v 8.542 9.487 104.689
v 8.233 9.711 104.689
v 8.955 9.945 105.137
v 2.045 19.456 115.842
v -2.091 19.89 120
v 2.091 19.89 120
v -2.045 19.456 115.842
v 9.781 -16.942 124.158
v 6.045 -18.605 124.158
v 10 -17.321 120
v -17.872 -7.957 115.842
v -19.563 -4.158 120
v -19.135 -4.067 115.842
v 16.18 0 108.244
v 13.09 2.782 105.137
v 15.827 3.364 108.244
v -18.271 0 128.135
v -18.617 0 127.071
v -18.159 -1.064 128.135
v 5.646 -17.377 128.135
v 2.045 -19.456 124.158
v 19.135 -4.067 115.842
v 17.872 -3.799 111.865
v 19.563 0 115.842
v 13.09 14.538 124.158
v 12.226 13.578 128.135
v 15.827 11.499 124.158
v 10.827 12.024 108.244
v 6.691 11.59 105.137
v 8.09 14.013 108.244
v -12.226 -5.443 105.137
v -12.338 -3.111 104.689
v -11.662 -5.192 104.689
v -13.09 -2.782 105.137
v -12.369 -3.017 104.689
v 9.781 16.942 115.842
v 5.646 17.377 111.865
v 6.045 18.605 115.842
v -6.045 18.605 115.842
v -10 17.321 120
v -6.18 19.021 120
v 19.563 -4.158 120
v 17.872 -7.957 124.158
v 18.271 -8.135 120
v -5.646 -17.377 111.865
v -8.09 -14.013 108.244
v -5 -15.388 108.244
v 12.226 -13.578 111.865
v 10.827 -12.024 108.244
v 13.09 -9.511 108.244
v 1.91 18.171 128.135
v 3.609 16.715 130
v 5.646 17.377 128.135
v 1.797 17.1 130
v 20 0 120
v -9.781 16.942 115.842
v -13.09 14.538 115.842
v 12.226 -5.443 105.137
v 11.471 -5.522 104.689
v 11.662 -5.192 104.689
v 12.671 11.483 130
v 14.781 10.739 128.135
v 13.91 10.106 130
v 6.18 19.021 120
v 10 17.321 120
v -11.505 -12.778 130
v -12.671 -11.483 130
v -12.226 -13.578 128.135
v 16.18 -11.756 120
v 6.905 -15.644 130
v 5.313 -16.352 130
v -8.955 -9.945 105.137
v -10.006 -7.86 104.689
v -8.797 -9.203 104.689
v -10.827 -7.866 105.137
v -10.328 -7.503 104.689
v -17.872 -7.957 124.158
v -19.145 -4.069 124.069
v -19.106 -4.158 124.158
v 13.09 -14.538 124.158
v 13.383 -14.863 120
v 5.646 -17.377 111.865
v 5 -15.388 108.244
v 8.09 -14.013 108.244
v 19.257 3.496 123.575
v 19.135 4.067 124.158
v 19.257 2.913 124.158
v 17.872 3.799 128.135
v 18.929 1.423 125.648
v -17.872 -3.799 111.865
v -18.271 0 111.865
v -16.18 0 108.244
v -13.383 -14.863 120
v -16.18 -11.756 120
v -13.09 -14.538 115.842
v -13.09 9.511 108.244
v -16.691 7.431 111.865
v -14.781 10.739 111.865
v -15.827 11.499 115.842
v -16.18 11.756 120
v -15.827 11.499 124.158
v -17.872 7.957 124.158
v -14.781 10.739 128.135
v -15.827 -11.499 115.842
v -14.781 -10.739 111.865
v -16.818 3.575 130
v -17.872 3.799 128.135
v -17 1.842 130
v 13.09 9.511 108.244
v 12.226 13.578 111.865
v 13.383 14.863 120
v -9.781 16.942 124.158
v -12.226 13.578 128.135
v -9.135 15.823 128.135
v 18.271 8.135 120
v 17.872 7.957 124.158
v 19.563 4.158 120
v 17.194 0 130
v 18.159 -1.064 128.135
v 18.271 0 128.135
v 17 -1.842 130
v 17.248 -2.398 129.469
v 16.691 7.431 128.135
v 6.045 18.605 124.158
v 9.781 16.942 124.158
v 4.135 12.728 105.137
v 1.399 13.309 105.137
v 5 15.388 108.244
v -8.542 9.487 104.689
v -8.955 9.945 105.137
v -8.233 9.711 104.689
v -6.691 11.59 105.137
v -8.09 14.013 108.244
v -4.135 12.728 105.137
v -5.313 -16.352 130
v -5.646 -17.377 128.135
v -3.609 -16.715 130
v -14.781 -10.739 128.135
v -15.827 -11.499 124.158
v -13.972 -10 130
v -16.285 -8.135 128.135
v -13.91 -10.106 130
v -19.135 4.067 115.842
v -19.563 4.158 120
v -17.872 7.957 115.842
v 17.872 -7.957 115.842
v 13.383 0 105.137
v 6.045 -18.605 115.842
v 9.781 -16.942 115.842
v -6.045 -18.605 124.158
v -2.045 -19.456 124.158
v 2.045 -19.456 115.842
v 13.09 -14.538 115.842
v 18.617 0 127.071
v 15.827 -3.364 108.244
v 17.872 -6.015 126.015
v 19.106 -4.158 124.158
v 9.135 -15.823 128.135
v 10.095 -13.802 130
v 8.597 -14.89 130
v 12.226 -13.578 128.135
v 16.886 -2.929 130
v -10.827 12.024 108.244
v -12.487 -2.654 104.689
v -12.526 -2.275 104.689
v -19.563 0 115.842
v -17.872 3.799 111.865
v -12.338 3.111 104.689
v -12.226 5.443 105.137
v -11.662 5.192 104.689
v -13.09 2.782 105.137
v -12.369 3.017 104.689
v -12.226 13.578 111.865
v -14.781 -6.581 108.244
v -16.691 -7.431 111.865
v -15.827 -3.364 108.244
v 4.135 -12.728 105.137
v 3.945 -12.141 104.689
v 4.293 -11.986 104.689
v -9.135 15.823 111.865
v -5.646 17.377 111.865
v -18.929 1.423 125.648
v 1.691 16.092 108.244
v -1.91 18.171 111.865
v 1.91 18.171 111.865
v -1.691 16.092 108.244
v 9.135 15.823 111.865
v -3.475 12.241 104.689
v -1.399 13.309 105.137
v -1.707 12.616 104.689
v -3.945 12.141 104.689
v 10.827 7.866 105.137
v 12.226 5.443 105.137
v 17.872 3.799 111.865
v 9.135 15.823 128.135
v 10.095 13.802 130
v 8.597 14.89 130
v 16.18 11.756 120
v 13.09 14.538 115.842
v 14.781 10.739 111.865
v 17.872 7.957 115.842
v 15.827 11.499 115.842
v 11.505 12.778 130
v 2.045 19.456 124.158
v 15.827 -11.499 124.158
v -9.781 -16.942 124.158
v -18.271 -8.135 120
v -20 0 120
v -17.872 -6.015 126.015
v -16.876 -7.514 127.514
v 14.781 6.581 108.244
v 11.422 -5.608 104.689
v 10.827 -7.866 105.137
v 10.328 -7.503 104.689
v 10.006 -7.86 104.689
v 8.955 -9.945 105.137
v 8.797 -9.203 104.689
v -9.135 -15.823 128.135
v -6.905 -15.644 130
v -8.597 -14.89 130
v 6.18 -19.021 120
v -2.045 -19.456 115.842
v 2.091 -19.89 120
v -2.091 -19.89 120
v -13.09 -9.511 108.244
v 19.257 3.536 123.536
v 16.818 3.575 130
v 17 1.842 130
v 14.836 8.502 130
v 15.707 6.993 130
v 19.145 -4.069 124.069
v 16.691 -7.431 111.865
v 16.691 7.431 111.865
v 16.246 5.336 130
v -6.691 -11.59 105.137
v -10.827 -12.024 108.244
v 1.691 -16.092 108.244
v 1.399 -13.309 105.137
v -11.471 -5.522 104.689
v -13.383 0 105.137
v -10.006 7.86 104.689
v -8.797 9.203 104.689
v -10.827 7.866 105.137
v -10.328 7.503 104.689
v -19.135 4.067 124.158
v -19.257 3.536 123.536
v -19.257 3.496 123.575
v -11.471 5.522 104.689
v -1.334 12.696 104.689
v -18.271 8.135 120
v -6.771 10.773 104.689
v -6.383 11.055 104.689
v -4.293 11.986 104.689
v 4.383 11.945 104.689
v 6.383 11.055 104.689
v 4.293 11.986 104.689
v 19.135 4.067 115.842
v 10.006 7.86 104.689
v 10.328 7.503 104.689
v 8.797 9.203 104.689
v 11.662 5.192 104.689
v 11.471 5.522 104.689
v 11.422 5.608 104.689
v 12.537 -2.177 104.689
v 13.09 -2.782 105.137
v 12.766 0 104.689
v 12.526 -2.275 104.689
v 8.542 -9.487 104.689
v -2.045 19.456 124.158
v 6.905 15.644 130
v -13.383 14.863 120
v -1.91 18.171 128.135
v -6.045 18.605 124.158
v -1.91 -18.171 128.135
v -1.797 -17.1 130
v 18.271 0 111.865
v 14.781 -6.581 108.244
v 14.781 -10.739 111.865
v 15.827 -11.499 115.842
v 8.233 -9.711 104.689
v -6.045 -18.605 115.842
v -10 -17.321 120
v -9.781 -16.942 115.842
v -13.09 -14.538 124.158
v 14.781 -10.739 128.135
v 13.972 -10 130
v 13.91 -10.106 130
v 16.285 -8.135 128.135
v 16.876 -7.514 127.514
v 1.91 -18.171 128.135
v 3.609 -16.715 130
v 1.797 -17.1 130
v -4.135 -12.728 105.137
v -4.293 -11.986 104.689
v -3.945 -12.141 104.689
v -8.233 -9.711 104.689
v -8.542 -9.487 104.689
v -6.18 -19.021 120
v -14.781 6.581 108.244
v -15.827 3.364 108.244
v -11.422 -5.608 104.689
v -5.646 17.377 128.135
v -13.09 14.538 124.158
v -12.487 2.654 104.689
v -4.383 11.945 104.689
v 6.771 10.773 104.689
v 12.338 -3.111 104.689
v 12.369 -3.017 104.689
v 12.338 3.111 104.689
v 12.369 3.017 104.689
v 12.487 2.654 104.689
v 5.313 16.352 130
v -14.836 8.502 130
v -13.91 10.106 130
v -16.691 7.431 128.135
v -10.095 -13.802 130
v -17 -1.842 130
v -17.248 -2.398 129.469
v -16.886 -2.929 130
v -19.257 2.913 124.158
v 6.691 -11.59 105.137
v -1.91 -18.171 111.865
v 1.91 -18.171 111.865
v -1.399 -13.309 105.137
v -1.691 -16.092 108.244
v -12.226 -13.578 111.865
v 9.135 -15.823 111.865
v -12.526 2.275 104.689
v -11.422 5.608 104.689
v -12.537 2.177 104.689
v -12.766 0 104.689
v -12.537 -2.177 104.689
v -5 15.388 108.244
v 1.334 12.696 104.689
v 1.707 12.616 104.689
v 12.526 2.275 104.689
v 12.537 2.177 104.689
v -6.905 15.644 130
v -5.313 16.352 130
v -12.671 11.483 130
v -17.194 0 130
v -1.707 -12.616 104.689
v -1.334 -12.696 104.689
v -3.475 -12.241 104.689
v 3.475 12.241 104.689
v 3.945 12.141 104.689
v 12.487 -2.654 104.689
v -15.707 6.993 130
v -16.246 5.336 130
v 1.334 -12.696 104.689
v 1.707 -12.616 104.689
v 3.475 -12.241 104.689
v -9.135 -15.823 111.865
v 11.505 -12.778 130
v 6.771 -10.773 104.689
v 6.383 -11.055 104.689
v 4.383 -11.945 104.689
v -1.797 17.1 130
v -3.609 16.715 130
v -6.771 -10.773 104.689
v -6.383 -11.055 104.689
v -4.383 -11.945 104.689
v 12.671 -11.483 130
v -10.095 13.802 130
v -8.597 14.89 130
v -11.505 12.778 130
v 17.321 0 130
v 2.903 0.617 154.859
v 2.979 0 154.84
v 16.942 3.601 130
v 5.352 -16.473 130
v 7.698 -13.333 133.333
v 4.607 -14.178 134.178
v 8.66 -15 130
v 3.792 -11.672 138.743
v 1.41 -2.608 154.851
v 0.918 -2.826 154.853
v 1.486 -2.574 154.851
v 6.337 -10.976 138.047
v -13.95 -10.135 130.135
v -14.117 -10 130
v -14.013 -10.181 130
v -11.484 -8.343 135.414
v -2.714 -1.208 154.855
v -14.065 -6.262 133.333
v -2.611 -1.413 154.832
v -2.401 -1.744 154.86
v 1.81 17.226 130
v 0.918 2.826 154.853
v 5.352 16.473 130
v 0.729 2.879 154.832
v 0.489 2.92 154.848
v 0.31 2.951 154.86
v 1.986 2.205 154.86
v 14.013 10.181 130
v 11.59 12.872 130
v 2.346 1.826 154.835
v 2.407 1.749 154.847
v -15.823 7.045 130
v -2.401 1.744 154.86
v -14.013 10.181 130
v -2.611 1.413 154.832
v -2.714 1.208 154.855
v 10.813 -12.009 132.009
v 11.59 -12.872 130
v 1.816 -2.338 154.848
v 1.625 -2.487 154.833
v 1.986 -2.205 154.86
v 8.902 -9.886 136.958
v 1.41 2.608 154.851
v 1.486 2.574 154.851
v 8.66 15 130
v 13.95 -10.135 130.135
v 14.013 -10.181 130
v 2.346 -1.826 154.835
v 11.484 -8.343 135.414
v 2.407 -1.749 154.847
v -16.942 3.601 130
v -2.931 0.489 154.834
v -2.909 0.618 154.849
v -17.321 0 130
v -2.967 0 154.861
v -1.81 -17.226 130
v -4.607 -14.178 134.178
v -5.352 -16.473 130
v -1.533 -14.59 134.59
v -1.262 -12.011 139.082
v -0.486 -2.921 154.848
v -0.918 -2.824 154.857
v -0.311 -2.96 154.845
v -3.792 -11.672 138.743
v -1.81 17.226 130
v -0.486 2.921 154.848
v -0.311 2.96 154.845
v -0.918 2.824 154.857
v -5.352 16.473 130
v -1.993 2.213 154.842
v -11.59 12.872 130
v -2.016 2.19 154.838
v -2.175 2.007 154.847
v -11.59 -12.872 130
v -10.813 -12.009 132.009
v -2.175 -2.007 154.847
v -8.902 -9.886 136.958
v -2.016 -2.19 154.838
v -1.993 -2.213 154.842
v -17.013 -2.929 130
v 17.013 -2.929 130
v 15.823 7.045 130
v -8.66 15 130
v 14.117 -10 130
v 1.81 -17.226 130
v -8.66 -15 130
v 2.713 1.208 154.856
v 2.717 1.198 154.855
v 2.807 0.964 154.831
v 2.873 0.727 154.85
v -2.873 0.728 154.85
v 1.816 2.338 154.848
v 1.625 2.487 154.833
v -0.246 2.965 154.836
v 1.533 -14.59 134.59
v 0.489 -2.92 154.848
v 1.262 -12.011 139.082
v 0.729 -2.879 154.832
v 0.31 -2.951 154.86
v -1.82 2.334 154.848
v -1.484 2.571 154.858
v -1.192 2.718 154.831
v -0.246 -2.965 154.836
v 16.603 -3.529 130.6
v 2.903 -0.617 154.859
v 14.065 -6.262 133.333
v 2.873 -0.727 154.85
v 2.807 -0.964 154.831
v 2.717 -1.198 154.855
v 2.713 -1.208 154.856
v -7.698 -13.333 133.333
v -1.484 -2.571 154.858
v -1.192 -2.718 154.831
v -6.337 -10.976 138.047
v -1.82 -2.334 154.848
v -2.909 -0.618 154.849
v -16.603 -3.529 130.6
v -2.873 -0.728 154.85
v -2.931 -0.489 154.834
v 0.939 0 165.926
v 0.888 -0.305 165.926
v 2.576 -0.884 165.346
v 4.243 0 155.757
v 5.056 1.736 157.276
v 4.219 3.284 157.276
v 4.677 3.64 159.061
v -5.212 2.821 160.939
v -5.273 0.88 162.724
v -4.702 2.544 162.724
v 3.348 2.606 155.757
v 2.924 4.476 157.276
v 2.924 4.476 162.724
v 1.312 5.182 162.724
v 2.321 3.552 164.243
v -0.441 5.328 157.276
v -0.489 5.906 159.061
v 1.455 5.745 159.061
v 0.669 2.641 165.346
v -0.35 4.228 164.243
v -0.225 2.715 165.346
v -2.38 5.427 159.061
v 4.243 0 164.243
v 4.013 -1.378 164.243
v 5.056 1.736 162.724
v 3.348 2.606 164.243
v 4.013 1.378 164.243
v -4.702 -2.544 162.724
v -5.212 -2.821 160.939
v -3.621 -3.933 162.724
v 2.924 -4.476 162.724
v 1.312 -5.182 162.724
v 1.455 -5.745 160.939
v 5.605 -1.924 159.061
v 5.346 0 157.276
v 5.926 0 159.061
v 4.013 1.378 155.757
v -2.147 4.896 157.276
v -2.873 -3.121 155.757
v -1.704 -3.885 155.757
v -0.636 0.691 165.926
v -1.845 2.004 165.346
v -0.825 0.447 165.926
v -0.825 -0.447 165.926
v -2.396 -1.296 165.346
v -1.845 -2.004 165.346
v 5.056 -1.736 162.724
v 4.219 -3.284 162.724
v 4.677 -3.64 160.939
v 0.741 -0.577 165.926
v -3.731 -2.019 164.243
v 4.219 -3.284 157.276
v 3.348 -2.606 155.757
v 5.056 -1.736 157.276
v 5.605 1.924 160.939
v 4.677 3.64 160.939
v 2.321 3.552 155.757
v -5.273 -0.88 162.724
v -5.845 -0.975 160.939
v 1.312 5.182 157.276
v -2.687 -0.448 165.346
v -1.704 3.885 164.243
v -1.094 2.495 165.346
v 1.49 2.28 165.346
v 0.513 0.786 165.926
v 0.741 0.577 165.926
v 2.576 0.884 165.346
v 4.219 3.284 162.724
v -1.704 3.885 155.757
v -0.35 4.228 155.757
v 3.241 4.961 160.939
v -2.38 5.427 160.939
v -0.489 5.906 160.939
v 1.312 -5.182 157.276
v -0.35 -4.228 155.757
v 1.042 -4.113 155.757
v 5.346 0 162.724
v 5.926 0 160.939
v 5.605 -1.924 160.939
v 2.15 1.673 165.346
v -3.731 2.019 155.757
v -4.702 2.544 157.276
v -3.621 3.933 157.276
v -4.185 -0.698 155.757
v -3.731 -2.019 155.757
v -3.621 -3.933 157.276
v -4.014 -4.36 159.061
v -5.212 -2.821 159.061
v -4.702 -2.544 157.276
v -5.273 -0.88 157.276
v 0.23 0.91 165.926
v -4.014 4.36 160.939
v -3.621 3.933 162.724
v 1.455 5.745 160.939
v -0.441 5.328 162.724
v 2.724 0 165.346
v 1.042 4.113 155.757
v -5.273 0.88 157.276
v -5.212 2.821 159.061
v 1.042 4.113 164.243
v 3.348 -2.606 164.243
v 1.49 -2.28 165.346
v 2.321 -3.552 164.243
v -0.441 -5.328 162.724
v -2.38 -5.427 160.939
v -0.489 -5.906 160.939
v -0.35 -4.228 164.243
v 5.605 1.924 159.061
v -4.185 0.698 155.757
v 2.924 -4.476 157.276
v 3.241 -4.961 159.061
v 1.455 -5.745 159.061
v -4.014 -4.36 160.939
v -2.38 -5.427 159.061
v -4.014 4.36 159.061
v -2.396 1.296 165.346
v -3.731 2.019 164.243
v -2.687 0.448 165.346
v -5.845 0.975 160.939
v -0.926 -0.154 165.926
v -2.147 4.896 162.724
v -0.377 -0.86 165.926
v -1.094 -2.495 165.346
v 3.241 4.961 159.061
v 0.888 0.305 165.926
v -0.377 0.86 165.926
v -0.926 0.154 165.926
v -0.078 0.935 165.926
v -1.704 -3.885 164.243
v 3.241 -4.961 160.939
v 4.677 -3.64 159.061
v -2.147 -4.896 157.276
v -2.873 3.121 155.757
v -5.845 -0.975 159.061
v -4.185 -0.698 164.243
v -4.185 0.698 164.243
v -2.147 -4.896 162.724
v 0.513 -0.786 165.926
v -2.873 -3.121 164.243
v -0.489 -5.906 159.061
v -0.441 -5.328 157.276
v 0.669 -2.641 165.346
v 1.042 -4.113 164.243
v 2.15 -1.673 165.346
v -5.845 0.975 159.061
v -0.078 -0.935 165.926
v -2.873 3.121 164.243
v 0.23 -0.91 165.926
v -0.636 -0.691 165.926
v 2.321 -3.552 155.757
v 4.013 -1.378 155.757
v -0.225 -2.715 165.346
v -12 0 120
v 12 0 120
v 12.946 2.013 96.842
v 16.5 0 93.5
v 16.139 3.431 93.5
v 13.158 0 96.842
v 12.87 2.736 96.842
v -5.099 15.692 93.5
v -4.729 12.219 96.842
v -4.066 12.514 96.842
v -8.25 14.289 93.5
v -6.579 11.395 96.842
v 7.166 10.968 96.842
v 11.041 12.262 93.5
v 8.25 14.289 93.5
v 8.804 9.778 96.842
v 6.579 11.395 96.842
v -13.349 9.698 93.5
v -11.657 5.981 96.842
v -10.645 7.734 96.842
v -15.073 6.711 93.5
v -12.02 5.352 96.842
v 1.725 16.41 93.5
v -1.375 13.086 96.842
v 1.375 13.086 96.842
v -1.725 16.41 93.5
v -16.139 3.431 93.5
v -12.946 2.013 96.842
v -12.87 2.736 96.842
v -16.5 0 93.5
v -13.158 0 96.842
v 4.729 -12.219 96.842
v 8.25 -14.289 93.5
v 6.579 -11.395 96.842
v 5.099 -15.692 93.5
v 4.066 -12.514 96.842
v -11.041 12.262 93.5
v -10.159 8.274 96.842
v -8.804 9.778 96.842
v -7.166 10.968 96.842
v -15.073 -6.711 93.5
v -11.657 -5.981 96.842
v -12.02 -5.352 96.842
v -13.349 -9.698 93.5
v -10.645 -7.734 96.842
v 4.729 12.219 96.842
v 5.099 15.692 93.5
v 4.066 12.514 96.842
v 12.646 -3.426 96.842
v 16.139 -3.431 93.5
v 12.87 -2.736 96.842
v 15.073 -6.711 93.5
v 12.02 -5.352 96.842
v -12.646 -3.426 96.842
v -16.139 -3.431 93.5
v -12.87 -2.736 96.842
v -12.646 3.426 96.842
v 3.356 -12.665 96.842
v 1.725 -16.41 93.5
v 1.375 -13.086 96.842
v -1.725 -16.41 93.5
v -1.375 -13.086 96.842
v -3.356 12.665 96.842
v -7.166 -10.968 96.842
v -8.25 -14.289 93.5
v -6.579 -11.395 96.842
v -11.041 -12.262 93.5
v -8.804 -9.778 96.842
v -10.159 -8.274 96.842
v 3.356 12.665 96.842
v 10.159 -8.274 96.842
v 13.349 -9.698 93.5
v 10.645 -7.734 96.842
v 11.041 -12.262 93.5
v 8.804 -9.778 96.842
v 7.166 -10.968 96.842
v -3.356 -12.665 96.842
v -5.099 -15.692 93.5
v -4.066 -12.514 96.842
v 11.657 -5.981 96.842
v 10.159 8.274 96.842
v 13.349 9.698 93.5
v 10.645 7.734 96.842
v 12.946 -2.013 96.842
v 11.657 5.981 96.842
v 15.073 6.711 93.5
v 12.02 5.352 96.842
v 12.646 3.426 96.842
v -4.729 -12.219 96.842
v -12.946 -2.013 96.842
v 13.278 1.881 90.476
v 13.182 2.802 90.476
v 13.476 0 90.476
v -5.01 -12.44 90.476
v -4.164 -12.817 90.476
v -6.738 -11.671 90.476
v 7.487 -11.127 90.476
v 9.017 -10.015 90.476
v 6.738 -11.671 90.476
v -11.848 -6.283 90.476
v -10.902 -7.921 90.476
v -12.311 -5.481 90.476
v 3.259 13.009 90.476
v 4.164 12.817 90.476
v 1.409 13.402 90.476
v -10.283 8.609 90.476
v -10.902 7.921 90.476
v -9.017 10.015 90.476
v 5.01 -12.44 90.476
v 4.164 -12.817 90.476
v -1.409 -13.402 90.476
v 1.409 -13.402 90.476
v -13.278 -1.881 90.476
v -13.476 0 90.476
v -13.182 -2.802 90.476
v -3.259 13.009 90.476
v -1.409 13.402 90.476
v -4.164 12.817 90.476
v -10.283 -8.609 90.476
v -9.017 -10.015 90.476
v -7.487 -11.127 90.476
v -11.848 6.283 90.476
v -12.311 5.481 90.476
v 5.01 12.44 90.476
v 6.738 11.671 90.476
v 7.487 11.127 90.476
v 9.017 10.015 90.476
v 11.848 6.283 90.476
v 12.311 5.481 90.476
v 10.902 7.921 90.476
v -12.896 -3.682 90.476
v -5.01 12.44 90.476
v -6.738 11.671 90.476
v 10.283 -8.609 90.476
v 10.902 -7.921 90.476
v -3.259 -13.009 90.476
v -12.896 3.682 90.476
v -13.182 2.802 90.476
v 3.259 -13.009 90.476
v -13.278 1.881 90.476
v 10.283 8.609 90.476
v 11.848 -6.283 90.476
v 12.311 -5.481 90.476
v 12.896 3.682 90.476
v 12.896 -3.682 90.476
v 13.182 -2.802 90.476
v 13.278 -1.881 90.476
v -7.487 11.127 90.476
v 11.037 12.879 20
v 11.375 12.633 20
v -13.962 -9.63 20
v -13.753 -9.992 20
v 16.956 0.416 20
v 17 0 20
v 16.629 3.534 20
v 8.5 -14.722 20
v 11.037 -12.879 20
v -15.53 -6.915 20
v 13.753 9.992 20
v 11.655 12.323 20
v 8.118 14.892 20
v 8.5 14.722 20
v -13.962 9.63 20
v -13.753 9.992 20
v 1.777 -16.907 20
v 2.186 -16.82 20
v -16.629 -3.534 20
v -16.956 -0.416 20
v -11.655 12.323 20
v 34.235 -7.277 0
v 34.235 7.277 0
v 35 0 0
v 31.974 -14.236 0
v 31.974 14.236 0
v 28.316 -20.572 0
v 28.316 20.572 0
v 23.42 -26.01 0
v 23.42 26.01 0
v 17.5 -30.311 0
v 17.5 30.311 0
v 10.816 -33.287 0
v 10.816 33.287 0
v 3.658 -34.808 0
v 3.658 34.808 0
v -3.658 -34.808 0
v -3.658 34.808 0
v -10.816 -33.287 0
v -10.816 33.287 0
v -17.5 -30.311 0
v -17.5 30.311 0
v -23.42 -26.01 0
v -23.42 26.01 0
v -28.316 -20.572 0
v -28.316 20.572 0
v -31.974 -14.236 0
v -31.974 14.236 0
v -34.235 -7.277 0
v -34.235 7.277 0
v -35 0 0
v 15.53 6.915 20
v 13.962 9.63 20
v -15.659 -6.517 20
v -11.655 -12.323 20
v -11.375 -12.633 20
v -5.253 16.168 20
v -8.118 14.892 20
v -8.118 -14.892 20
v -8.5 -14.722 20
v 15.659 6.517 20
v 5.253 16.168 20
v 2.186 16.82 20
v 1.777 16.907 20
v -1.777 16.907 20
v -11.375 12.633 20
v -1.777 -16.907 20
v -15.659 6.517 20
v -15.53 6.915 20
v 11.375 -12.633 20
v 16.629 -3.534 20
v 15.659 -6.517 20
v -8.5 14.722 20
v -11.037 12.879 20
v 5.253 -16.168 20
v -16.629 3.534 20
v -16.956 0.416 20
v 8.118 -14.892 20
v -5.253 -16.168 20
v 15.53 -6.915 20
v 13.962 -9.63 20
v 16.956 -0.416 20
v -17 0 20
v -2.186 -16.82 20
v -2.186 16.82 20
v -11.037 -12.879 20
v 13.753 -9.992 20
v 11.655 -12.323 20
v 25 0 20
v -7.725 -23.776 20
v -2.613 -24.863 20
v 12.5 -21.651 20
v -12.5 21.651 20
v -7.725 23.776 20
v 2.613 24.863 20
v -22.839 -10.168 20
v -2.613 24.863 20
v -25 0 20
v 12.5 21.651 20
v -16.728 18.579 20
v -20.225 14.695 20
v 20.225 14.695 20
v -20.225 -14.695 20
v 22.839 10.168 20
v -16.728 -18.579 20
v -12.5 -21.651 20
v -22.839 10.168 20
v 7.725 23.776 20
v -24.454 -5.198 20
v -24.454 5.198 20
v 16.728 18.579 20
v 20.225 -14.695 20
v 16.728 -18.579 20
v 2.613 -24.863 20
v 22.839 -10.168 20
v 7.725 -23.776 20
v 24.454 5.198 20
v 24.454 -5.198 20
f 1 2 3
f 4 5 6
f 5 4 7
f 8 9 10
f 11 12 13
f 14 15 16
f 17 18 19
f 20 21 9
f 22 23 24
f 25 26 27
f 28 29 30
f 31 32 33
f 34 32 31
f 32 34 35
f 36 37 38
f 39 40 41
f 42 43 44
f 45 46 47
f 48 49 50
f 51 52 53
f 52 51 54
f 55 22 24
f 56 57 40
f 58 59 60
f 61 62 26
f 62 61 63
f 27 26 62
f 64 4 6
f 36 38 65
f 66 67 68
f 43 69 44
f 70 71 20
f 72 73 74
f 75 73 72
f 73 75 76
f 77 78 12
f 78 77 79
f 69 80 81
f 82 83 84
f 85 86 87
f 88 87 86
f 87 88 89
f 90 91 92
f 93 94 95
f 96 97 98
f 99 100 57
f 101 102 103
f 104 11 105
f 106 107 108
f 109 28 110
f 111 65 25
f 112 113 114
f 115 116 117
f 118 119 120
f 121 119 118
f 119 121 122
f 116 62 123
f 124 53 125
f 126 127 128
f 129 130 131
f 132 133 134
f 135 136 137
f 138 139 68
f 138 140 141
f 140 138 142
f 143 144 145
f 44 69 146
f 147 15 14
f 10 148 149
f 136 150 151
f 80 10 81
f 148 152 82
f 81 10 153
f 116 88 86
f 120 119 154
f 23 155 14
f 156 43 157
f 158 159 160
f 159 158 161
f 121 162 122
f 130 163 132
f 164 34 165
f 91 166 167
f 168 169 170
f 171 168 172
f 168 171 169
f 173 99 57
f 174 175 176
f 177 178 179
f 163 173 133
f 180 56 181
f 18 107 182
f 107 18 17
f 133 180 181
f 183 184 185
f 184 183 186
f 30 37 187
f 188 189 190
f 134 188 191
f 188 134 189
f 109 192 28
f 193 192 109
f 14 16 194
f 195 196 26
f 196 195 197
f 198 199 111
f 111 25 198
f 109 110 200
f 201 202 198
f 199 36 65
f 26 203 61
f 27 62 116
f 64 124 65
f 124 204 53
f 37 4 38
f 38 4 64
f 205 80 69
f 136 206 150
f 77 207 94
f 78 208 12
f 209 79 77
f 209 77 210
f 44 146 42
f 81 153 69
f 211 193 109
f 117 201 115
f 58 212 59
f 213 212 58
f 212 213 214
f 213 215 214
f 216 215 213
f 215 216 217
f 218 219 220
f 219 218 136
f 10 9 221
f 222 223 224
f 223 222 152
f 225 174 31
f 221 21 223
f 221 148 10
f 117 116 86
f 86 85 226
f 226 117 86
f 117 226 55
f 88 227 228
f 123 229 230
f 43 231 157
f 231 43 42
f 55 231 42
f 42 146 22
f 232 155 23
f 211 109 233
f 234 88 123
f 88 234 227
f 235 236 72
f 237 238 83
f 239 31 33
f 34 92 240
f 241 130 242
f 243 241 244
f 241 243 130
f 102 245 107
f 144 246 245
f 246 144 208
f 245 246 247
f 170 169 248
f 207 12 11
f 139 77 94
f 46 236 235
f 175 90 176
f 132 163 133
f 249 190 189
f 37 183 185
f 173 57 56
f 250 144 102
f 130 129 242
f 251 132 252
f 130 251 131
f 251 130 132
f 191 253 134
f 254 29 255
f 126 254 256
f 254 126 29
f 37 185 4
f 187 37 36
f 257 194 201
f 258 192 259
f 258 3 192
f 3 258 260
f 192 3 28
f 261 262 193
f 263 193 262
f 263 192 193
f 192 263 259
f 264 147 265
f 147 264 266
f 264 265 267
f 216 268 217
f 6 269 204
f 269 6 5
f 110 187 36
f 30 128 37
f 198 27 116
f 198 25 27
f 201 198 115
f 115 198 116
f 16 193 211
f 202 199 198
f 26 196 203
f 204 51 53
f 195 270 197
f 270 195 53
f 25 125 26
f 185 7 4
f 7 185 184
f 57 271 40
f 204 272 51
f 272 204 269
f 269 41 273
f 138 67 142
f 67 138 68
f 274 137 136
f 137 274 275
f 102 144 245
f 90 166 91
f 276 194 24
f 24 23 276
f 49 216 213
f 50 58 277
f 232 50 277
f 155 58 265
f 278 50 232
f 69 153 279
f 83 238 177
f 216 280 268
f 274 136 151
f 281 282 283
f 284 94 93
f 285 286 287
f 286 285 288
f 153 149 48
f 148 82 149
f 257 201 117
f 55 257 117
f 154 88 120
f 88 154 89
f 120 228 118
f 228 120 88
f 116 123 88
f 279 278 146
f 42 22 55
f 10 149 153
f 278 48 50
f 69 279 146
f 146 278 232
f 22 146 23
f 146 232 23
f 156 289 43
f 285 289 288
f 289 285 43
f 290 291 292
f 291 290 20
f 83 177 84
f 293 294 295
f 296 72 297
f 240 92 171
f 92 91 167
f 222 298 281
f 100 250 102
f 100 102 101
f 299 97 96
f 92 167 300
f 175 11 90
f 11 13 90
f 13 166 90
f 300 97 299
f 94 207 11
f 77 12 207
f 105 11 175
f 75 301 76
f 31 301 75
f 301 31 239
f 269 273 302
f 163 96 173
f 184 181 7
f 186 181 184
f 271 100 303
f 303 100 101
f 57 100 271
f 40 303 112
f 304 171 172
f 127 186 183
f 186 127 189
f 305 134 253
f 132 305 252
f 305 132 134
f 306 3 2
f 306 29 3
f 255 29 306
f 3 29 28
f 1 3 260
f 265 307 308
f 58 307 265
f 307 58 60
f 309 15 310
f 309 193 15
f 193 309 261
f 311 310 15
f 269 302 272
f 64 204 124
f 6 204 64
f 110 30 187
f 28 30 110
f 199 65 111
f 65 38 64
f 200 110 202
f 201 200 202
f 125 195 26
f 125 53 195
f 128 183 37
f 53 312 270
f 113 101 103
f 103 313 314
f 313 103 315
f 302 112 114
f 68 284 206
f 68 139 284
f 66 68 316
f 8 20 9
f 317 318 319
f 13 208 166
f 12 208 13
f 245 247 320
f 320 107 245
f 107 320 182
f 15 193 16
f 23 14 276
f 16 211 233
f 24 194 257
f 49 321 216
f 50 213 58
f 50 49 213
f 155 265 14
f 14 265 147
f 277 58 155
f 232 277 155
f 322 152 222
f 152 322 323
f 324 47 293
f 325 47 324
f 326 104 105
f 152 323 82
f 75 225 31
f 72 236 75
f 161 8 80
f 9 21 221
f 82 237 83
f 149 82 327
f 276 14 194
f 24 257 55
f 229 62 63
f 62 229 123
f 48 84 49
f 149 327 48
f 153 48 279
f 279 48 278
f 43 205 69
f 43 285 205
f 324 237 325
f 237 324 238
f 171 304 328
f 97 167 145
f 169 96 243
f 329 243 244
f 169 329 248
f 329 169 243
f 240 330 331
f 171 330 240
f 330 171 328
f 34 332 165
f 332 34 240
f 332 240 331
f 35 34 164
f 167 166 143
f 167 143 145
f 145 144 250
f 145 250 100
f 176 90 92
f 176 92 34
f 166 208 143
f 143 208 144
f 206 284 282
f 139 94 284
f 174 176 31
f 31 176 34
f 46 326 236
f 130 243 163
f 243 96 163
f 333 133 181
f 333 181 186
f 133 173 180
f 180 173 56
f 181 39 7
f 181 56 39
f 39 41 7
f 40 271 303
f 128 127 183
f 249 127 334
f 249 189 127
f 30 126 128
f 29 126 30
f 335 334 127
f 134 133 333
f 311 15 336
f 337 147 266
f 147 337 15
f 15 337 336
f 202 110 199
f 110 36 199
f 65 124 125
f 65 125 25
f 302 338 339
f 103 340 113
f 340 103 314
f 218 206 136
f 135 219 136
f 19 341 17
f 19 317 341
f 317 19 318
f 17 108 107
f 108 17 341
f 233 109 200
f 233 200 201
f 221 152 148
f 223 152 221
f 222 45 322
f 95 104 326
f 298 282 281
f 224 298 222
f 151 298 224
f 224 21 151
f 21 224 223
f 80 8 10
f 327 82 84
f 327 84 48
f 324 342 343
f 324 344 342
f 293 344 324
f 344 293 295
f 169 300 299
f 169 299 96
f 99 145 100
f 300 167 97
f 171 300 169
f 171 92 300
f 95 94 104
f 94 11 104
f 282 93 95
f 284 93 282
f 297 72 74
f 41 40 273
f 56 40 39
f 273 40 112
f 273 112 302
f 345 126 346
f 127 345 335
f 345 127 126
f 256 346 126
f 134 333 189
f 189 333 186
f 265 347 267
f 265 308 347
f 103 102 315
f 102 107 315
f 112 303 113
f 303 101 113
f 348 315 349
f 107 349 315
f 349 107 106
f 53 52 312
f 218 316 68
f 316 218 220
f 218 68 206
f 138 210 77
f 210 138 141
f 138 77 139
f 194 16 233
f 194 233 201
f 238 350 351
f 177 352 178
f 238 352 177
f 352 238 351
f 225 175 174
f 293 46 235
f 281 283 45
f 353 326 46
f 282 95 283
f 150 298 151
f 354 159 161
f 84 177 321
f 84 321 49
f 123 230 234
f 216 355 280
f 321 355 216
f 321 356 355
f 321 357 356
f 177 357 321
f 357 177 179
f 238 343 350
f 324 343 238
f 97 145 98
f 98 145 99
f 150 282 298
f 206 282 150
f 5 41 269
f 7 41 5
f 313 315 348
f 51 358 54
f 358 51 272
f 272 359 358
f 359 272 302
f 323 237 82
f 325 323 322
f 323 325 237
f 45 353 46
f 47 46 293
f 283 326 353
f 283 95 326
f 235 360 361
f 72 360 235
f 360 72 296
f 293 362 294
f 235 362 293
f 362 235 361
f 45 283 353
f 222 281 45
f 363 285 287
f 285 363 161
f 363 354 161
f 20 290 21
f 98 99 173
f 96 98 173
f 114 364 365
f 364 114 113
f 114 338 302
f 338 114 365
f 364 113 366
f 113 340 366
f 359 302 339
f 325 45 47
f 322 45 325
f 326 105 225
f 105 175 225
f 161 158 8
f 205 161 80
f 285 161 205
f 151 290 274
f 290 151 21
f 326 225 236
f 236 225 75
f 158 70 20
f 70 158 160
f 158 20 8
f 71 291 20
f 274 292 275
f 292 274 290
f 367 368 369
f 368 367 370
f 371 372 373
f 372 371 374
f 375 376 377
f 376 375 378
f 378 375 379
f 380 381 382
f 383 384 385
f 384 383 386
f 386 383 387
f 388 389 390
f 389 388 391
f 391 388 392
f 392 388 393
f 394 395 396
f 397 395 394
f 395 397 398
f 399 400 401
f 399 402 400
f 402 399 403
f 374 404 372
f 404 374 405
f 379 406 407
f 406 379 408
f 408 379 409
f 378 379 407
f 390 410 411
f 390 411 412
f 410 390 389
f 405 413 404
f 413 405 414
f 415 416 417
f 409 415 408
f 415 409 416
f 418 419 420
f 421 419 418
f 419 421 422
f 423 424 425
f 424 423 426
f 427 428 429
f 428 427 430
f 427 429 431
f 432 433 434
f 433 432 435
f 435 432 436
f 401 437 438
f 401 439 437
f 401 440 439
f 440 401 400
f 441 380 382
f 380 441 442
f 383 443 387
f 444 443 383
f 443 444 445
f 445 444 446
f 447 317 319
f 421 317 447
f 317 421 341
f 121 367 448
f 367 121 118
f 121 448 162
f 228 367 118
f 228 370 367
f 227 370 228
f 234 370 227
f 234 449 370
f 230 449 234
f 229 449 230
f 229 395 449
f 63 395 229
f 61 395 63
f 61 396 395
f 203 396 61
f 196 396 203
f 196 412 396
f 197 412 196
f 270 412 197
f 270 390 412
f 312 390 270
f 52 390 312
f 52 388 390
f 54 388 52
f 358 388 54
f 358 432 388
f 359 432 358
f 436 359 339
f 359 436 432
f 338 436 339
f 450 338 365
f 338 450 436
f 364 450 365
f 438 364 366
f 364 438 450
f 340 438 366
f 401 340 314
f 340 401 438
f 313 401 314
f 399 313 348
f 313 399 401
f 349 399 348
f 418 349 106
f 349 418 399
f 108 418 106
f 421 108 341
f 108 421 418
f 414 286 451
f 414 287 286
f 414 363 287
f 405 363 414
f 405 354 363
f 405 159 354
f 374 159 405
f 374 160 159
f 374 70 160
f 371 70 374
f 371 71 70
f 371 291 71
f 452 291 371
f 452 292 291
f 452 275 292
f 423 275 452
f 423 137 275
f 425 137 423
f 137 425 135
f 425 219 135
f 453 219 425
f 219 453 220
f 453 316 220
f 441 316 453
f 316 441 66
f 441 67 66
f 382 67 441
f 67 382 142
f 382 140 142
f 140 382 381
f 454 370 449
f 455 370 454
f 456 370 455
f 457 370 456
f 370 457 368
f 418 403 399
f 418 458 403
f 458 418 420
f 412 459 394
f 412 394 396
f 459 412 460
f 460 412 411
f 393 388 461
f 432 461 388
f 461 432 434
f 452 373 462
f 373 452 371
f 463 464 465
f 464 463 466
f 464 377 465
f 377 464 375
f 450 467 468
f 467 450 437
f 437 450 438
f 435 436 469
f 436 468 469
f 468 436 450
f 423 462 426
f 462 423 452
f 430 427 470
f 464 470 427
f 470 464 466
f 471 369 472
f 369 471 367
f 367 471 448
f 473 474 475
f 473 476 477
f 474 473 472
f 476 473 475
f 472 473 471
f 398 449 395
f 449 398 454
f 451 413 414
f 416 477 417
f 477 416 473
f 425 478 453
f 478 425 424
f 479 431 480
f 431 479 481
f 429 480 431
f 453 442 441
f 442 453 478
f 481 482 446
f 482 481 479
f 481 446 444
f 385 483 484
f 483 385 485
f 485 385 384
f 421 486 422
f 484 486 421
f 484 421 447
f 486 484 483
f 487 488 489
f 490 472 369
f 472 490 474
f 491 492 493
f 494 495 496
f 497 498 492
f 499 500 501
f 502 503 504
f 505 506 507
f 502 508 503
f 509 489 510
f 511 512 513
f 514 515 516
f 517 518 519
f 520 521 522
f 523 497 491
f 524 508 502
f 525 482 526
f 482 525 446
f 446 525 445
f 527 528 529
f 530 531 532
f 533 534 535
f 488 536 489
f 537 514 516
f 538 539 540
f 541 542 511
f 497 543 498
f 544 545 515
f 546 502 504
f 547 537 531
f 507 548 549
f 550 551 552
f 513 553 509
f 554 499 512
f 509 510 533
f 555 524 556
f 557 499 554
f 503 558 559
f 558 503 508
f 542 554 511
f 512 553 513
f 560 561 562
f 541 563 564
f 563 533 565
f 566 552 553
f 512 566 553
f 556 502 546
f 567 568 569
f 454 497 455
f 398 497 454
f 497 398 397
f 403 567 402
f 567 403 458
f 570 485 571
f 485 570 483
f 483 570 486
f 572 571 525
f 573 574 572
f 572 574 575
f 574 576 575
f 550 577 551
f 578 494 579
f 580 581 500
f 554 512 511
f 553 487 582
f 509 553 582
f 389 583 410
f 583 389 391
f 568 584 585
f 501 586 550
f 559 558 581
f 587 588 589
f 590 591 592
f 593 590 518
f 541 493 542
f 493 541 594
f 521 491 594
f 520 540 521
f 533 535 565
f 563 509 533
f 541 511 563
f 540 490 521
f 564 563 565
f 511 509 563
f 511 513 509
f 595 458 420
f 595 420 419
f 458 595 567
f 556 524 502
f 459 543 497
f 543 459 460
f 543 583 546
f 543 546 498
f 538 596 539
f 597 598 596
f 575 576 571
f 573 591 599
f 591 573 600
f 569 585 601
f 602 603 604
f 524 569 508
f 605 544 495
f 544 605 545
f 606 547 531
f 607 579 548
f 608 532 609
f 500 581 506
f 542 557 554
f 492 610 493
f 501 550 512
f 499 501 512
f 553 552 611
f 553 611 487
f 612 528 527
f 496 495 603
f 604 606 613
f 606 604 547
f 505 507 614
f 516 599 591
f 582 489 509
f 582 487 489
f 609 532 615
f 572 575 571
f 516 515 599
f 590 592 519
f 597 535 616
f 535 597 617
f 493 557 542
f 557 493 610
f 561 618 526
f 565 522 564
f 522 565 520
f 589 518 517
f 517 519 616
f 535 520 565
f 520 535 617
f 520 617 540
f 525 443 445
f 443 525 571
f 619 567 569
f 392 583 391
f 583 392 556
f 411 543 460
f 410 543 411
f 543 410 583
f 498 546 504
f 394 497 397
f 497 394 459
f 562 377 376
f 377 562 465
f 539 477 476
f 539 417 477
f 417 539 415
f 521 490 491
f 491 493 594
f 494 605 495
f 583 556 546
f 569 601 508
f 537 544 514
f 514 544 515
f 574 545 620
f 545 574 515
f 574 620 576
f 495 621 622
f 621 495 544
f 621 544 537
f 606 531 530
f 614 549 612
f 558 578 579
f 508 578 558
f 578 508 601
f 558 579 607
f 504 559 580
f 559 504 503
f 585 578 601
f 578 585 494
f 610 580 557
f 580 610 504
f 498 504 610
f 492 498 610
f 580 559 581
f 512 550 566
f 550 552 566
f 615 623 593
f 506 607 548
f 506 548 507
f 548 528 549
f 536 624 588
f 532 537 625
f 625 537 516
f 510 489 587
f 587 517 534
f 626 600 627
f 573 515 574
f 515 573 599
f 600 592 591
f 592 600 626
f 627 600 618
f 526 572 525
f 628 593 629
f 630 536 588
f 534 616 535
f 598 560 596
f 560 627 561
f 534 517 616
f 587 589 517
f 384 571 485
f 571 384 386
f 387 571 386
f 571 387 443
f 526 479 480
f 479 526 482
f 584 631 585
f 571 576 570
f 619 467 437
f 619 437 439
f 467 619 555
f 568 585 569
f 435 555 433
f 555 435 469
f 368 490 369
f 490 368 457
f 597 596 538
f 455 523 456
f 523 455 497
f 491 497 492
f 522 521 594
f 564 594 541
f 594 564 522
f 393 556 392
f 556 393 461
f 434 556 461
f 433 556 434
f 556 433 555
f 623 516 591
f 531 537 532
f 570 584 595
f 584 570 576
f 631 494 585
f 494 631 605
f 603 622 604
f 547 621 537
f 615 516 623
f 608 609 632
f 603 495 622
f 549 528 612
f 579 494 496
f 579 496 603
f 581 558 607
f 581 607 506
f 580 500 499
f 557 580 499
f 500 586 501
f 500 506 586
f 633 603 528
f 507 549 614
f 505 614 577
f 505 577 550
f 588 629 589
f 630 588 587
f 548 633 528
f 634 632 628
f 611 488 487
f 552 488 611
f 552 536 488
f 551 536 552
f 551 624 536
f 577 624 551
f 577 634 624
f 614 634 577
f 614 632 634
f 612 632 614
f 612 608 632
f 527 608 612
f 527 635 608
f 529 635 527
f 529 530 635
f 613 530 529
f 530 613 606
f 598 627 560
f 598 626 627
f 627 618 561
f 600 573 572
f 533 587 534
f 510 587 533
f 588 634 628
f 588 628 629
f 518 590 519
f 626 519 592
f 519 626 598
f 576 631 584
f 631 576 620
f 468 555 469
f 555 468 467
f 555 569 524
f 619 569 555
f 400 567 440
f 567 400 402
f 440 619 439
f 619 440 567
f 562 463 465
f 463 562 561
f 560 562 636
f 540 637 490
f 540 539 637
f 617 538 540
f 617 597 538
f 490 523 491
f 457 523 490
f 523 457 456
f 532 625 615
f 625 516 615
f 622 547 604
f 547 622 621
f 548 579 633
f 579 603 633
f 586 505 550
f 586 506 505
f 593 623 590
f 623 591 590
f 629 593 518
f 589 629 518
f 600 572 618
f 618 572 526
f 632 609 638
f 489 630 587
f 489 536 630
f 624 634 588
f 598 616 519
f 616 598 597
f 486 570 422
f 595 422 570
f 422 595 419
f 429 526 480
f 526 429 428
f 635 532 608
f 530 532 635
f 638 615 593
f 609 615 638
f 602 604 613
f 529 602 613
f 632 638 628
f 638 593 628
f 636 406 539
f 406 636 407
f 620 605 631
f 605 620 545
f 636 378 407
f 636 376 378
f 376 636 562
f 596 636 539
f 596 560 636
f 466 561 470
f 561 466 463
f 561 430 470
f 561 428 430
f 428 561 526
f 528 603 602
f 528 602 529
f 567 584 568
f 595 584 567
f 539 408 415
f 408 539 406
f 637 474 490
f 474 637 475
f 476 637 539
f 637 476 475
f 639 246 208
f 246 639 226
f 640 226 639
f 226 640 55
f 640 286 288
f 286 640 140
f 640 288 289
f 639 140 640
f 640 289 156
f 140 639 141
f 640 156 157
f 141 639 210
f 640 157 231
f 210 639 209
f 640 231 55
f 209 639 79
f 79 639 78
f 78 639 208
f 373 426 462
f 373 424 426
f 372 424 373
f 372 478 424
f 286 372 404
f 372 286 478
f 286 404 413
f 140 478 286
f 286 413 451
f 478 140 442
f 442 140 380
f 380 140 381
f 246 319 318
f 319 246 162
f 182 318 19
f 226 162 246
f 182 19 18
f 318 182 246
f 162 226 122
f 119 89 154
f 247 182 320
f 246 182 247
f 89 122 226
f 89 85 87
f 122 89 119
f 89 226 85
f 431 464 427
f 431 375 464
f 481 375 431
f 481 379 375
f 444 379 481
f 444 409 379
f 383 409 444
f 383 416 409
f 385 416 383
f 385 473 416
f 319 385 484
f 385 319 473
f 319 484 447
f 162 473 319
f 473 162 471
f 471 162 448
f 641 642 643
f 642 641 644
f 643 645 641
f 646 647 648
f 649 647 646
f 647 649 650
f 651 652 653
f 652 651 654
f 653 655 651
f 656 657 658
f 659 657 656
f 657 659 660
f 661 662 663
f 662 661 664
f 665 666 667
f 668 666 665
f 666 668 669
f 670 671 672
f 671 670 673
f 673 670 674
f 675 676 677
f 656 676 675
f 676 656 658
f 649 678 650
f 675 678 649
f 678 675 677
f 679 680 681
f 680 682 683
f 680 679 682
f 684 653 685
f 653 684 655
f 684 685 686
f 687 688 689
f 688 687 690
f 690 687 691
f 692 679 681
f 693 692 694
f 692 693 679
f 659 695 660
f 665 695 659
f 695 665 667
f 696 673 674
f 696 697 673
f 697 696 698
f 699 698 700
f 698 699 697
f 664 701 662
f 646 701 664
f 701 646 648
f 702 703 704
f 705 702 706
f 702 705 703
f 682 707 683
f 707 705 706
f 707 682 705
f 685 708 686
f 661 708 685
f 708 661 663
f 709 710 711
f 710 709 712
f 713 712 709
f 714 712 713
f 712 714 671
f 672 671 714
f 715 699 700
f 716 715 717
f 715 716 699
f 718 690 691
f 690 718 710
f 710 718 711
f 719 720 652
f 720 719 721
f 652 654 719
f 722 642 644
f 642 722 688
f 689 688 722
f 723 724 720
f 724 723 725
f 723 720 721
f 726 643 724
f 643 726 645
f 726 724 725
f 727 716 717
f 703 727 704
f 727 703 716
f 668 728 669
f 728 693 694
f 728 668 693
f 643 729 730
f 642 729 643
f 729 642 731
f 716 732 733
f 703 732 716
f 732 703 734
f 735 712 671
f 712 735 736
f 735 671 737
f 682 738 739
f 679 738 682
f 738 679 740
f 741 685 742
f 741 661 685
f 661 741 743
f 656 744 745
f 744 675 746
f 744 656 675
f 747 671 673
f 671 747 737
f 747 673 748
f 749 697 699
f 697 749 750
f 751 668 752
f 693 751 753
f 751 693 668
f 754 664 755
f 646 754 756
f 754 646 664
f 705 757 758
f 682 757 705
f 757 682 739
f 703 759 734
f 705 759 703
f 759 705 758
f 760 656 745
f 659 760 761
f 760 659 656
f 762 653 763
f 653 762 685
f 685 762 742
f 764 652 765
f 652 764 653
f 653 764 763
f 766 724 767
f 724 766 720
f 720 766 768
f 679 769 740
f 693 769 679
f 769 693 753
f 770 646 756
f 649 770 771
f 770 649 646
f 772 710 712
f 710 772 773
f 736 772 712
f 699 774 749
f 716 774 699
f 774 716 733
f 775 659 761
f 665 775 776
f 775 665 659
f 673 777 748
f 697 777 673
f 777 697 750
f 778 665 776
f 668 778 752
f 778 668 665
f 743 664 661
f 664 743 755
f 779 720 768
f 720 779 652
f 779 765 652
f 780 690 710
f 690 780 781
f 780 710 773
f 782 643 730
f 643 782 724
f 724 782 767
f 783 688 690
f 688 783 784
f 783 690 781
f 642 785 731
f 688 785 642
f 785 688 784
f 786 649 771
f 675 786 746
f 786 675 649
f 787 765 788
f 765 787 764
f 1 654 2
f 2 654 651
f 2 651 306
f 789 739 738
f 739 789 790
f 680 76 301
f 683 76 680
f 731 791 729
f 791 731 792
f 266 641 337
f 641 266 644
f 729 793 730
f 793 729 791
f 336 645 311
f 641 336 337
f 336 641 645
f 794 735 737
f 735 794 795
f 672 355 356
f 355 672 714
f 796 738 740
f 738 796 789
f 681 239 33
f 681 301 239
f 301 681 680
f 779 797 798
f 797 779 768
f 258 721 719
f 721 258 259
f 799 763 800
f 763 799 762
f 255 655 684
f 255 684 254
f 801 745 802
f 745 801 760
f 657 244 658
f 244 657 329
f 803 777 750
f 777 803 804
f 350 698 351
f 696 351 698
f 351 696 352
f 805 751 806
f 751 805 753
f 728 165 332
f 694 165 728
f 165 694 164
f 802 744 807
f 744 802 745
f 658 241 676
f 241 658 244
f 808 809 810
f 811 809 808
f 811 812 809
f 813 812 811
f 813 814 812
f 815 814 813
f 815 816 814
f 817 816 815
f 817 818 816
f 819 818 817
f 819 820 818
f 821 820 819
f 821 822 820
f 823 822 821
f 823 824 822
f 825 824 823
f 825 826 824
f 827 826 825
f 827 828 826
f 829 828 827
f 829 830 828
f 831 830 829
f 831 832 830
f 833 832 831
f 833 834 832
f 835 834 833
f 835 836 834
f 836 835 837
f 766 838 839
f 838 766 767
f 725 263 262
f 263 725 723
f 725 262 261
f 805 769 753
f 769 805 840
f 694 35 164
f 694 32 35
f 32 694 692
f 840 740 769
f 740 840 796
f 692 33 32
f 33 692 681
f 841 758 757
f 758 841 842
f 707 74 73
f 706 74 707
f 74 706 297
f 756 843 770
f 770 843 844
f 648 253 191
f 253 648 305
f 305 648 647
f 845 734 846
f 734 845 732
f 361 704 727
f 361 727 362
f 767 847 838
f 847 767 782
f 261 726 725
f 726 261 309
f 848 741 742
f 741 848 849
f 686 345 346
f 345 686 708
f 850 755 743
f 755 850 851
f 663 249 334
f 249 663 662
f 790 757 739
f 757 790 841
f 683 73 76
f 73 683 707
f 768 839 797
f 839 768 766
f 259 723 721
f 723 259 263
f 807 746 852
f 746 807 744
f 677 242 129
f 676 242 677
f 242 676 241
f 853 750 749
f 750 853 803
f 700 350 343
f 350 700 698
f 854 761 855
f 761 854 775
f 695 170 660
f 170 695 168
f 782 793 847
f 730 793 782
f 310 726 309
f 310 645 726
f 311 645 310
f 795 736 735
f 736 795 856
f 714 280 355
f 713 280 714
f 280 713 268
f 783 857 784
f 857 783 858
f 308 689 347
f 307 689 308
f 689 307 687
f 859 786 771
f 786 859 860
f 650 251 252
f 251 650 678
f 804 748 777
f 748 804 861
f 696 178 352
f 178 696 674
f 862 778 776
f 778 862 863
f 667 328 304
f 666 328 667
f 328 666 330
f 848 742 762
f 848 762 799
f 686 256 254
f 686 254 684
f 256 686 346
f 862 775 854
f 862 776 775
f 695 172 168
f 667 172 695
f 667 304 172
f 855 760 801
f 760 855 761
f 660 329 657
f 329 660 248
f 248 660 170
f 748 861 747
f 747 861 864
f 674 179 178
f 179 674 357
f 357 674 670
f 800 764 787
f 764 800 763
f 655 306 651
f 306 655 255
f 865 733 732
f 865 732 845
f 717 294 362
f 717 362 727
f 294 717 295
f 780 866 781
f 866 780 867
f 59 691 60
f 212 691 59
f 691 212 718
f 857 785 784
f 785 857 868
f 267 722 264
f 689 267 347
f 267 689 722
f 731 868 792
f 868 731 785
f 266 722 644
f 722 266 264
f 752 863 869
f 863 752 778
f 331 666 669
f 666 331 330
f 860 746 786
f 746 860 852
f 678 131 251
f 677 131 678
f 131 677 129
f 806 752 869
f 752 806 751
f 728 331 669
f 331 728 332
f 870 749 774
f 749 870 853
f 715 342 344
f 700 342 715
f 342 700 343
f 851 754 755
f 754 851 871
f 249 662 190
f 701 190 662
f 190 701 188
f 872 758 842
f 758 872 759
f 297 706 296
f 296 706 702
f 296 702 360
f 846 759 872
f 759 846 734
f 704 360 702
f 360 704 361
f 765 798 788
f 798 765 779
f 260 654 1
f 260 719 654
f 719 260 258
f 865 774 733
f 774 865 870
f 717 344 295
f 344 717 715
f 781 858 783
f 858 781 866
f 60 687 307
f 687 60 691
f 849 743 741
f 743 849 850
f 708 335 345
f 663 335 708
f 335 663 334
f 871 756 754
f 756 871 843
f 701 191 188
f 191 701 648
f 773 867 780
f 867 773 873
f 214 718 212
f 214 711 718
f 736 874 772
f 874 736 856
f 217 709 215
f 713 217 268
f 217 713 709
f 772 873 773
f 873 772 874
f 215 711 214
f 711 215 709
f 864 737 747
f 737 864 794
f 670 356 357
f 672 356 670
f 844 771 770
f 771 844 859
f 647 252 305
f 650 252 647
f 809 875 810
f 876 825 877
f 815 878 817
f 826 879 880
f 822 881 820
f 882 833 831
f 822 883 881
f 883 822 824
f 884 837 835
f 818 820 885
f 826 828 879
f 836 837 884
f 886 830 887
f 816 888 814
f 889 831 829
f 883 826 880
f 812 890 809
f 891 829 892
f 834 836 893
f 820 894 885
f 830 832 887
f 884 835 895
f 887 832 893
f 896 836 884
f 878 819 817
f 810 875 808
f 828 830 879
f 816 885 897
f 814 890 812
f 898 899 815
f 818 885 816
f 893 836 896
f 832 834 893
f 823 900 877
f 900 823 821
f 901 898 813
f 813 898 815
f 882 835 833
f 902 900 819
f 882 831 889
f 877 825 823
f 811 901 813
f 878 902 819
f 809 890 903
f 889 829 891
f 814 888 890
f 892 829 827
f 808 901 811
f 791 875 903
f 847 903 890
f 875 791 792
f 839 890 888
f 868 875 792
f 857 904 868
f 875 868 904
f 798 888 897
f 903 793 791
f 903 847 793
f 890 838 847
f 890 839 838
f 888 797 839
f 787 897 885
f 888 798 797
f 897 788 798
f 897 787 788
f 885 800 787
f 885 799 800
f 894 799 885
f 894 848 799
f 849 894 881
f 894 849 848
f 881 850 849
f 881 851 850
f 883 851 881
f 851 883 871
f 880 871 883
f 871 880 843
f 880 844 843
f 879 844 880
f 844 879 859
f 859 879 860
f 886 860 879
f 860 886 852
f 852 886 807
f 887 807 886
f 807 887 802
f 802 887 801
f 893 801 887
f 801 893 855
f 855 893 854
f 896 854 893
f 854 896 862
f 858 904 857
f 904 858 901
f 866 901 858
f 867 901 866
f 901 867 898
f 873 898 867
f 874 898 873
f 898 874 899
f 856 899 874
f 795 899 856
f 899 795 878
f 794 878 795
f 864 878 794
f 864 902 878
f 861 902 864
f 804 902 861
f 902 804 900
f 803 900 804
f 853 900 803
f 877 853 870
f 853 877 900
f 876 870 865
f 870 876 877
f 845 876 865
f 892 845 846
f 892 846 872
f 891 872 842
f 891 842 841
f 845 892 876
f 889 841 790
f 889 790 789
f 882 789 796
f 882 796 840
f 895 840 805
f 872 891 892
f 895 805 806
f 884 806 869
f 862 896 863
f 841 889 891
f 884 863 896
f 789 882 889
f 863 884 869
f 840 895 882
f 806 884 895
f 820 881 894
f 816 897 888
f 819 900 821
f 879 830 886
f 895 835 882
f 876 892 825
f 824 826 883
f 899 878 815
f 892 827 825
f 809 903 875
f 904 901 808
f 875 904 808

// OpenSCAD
union (){
    translate([0, 0, 120])
    difference() {
        // head
        union () {
            // top sphere
            sphere(r = 20);

            translate([0,0, 20*sin(30)])
                cylinder(h=30,r1=20 * cos(30), r2=0);

            translate([0,0,30+20 * sin(30)])
                sphere(r = 6);
            }
        // the side cut
        rotate([45,0,0])
            translate([-20,0,0])
                cube([40,5,40]);
        }

    // stem
    cylinder(h=120,r1=18,r2=12);
    
    // base
    cylinder(h=20,r1=35,r2=25);



    // the jewel cut
    translate([0,0,90])
    intersection () {
        cylinder (h=20, r1=20, r2=0);
        translate([0,0,7])
            mirror([0,0,1])
                cylinder(h=20, r1=20, r2=0);
    }
    


}
// 
